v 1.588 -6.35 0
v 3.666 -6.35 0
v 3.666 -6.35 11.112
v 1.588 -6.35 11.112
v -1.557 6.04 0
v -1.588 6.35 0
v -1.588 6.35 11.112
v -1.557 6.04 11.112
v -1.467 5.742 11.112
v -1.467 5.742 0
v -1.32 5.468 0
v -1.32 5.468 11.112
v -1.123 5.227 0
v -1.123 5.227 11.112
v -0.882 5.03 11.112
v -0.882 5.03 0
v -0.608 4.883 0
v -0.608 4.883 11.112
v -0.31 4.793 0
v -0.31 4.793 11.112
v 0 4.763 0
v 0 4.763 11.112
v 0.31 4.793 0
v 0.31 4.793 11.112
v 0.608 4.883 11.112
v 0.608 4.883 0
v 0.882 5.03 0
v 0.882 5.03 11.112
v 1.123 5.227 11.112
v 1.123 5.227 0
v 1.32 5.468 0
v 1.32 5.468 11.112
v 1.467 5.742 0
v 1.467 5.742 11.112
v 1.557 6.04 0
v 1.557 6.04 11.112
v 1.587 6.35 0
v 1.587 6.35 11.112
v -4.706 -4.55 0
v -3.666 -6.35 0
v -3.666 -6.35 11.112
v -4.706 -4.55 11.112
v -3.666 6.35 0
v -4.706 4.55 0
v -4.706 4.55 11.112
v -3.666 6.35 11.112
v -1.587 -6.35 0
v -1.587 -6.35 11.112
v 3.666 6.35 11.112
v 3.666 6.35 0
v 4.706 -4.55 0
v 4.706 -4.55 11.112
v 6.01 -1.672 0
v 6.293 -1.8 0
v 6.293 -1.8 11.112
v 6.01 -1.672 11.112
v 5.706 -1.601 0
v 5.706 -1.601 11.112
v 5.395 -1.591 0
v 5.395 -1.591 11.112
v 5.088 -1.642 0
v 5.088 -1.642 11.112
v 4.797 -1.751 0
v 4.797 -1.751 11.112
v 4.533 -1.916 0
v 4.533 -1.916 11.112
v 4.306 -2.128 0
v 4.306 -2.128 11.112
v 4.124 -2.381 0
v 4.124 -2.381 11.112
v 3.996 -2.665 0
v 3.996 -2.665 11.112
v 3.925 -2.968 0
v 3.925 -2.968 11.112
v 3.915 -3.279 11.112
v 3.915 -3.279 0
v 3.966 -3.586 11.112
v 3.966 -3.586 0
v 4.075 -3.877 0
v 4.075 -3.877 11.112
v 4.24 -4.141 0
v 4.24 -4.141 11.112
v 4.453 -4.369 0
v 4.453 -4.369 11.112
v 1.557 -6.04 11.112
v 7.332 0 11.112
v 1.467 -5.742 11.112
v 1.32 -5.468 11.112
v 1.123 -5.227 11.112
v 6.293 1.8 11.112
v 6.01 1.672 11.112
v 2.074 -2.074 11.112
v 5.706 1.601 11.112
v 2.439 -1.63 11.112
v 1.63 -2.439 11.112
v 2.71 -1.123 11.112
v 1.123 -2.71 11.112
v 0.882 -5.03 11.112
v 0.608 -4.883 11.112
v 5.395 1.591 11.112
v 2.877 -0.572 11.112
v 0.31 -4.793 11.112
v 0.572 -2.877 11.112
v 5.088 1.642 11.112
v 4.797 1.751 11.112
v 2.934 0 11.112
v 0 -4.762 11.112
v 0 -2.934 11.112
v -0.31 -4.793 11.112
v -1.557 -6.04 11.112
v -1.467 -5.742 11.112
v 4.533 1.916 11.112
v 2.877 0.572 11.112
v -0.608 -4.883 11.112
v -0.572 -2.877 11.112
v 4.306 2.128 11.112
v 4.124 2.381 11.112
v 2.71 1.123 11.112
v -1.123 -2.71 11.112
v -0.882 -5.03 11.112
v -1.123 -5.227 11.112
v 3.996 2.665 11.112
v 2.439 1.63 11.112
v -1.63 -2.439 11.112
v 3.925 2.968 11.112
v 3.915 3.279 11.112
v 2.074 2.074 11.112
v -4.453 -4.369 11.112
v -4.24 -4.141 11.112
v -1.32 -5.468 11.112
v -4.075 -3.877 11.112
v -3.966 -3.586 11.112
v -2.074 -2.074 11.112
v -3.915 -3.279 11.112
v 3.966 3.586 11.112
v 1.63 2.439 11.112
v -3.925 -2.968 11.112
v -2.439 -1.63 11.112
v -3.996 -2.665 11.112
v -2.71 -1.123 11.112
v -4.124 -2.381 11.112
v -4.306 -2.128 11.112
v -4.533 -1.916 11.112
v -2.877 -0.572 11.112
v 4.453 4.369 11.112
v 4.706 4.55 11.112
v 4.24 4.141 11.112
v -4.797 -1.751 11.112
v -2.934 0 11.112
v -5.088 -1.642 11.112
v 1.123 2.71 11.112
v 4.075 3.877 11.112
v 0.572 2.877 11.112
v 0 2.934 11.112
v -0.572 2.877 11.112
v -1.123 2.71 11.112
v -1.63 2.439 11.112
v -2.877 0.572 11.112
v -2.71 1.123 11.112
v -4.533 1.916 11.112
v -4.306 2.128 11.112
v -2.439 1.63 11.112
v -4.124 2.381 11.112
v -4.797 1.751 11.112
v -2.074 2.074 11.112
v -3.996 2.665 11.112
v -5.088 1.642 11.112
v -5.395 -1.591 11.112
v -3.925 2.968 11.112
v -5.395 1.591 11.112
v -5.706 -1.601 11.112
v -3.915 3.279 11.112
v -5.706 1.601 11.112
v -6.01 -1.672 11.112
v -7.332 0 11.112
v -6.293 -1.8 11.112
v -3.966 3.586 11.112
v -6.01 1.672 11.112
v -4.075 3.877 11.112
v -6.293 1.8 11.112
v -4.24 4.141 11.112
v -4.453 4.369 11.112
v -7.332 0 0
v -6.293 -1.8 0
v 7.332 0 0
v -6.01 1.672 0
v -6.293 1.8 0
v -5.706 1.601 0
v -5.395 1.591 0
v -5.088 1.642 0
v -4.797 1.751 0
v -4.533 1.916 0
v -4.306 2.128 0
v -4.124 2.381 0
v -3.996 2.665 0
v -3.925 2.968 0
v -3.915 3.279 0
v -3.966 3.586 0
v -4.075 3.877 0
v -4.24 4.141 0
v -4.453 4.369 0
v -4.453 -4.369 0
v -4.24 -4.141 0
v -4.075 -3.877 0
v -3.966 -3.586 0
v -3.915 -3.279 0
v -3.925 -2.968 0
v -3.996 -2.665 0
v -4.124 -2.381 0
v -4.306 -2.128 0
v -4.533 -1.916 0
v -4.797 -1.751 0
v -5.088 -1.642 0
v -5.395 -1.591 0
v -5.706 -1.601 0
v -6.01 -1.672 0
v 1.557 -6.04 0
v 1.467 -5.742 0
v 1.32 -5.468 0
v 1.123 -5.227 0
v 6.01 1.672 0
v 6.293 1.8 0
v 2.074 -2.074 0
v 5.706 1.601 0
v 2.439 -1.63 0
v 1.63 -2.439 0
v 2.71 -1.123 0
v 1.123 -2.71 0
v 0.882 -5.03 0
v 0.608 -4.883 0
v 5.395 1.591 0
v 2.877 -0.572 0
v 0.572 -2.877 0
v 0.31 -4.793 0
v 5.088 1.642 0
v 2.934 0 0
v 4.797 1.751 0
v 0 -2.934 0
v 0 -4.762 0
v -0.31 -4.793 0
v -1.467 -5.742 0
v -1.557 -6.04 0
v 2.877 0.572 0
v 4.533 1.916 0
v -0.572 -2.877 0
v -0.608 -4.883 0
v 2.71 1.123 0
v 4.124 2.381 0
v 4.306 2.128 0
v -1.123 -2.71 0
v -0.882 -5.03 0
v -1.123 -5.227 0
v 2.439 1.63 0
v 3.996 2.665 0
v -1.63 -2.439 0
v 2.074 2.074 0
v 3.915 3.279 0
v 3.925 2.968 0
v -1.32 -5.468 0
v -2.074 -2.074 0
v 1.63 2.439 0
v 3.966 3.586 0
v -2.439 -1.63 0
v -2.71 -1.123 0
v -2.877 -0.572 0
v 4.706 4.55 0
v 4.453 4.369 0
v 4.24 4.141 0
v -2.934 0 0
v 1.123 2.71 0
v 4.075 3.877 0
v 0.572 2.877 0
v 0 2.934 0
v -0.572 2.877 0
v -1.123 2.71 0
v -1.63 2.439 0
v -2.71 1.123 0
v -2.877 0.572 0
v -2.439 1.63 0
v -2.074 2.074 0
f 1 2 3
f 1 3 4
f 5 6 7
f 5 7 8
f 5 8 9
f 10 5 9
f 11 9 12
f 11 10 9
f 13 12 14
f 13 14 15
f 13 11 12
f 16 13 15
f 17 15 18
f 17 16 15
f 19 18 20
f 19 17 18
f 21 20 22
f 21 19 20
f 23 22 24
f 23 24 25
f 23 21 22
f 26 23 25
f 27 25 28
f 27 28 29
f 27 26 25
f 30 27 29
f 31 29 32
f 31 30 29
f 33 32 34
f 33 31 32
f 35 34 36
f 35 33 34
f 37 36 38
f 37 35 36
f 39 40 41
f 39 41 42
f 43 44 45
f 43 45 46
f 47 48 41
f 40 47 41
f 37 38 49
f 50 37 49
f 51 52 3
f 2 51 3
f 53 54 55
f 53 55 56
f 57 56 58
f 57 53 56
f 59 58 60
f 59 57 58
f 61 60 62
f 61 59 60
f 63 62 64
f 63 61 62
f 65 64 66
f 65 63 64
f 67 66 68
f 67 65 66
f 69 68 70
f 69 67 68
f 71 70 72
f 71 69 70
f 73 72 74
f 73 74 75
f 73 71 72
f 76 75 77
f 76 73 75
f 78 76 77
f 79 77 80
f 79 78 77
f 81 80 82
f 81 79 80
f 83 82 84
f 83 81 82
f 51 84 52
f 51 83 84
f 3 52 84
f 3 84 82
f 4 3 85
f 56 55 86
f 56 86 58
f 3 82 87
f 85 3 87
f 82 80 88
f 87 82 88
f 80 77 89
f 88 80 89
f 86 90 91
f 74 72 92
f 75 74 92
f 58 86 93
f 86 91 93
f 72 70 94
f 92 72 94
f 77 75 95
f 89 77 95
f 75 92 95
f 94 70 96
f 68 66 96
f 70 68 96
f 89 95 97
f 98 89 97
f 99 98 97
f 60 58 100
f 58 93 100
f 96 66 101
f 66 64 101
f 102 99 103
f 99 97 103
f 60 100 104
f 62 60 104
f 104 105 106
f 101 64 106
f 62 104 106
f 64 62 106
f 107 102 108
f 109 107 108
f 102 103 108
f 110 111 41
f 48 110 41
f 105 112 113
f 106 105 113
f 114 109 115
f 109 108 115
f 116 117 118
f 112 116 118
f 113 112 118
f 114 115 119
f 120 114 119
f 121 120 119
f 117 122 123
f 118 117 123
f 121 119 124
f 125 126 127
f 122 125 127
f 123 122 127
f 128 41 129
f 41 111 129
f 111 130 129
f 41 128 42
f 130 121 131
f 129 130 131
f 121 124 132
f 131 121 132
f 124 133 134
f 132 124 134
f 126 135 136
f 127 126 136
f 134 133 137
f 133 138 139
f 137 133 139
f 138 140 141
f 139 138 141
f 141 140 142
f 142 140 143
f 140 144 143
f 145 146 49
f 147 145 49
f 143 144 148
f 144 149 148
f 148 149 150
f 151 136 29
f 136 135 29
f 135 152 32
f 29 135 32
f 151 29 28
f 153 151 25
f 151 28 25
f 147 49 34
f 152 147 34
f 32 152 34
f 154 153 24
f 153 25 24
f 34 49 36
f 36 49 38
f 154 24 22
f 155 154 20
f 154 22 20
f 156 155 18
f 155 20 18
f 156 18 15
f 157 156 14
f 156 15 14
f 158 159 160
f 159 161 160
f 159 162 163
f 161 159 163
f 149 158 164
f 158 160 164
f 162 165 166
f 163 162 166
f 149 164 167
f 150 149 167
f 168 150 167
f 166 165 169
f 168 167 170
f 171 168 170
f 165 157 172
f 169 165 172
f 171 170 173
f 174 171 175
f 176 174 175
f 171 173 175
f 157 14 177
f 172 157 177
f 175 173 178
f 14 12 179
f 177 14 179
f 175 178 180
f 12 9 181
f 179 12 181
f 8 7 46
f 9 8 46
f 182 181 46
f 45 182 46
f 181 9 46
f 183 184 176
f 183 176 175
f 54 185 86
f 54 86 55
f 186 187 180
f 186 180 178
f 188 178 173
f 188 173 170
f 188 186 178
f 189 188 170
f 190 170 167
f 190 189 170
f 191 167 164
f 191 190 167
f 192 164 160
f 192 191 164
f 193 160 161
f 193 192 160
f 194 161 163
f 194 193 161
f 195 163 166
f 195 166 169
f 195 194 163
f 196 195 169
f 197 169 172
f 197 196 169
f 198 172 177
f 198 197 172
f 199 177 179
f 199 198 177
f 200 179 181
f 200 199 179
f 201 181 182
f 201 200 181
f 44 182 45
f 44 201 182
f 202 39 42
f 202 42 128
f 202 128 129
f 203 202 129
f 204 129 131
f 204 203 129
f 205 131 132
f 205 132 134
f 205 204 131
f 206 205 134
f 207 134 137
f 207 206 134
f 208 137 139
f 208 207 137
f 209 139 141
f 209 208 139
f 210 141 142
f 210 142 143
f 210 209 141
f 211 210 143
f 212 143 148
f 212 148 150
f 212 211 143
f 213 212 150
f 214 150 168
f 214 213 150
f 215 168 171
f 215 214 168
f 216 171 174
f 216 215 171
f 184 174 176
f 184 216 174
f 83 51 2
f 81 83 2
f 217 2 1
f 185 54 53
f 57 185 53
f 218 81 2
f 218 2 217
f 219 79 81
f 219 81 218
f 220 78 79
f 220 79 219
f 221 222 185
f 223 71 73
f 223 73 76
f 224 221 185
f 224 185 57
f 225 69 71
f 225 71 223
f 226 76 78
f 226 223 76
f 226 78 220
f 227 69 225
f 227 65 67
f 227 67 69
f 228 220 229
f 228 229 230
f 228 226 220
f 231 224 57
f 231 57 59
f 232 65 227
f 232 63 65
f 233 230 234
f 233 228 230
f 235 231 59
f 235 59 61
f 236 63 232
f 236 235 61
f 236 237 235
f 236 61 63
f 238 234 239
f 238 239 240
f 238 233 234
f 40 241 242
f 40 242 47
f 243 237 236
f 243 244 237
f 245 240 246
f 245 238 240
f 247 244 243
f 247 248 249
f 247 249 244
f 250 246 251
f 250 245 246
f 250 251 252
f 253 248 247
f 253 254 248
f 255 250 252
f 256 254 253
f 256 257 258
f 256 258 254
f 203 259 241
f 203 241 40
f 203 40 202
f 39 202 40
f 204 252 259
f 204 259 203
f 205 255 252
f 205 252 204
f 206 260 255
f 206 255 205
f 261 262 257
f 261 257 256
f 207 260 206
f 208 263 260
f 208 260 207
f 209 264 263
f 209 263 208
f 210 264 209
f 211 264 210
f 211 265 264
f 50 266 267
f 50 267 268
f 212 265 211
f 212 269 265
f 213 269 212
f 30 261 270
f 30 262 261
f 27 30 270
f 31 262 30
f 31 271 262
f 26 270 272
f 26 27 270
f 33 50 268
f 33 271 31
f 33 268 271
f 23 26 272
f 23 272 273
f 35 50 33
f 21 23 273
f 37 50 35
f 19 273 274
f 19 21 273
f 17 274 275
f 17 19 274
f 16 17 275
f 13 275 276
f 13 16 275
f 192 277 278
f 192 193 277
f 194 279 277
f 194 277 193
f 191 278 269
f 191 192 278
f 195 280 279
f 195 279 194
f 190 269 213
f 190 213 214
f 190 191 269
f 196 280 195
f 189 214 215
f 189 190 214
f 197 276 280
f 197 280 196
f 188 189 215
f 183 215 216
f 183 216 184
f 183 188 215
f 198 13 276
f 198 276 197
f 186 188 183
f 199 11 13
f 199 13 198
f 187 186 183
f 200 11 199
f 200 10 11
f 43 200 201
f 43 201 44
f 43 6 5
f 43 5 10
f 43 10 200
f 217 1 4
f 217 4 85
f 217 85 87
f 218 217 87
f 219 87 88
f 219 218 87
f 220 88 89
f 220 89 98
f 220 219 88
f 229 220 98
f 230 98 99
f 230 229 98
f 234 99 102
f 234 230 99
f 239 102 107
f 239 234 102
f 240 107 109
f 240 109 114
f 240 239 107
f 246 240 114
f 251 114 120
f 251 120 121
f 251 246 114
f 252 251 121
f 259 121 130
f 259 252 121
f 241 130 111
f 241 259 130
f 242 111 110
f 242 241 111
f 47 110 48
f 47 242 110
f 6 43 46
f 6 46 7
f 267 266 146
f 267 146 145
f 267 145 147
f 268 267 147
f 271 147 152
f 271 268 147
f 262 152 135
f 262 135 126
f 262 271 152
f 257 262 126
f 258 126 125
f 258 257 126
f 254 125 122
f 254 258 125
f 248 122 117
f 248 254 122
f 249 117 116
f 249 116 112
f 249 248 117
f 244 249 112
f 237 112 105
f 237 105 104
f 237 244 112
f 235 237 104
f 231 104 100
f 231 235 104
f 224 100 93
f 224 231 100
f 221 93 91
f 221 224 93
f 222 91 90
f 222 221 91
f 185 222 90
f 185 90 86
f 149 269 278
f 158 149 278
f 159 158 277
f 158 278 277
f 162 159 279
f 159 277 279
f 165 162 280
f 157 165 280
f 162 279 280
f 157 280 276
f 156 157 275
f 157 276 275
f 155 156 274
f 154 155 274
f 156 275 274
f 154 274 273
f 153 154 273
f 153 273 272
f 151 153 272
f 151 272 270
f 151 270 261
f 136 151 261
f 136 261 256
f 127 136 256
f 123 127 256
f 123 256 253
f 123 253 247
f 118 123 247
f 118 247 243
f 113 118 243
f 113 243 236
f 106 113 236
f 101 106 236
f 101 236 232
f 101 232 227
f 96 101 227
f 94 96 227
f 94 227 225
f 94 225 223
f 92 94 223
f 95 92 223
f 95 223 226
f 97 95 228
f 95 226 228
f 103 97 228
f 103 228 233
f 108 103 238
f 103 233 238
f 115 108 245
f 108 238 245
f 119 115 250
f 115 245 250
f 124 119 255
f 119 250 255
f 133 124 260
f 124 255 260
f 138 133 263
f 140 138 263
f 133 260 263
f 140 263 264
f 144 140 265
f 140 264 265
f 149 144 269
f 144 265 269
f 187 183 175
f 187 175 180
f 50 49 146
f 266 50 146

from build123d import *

# Parameters (mm, degrees)
SKETCH1_R           = 2.9337
BOSS_EXTRUDE1_DEPTH = 15.875
CUT_EXTRUDE1_DEPTH  = 4.7625


with BuildPart() as part:
    # Sketch1 → Boss-Extrude1 (new body)
    with BuildSketch(Plane(origin=(0, 0, 0), x_dir=(-1, 0, 0), z_dir=(0, 0, -1))):
        with BuildLine():
            Line((-4.70551159, -4.549815043), (-3.666174521, -6.349999904))
            Line((-3.666174521, -6.349999904), (-1.587500385, -6.349999904))
            ThreePointArc((-1.587500385, -6.349999904), (-3.85e-07, -4.762499904), (1.587499615, -6.349999904))
            Line((1.587499615, -6.349999904), (3.666173825, -6.349999904))
            Line((3.666173825, -6.349999904), (4.705510942, -4.54981524))
            ThreePointArc((4.705510942, -4.54981524), (4.124445629, -2.381249907), (6.293010962, -1.800184594))
            Line((6.293010962, -1.800184594), (7.332348079, 7e-08))
            Line((7.332348079, 7e-08), (6.293011217, 1.800184685))
            ThreePointArc((6.293011217, 1.800184685), (4.124445939, 2.381250203), (4.705511457, 4.549815481))
            Line((4.705511457, 4.549815481), (3.666174521, 6.350000222))
            Line((3.666174521, 6.350000222), (1.587500385, 6.350000222))
            ThreePointArc((1.587500385, 6.350000222), (3.85e-07, 4.762500222), (-1.587499615, 6.350000222))
            Line((-1.587499615, 6.350000222), (-3.666173825, 6.350000222))
            Line((-3.666173825, 6.350000222), (-4.705511038, 4.549815614))
            ThreePointArc((-4.705511038, 4.549815614), (-4.124445841, 2.38125025), (-6.293011205, 1.800185053))
            Line((-6.293011205, 1.800185053), (-7.332348419, 4.44e-07))
            Line((-7.332348419, 4.44e-07), (-6.293011423, -1.80018429))
            ThreePointArc((-6.293011423, -1.80018429), (-4.12444613, -2.38124975), (-4.70551159, -4.549815043))
        make_face()
        Circle(SKETCH1_R, mode=Mode.SUBTRACT)
    extrude(amount=-BOSS_EXTRUDE1_DEPTH)

    # Sketch3 → Cut-Extrude1 (cut)
    with BuildSketch(Plane.XY.offset(15.875)):
        with BuildLine():
            Line((-4.705511457, 4.549815481), (-3.666174521, 6.350000222))
            Line((-3.666174521, 6.350000222), (-1.587500385, 6.350000222))
            ThreePointArc((-1.587500385, 6.350000222), (-3.85e-07, 4.762500222), (1.587499615, 6.350000222))
            Line((1.587499615, 6.350000222), (3.666173825, 6.350000222))
            Line((3.666173825, 6.350000222), (4.705511038, 4.549815614))
            ThreePointArc((4.705511038, 4.549815614), (4.124445841, 2.38125025), (6.293011205, 1.800185053))
            Line((6.293011205, 1.800185053), (7.332348419, 4.44e-07))
            Line((7.332348419, 4.44e-07), (6.293011423, -1.80018429))
            ThreePointArc((6.293011423, -1.80018429), (4.12444613, -2.38124975), (4.70551159, -4.549815043))
            Line((4.70551159, -4.549815043), (3.666174521, -6.349999904))
            Line((3.666174521, -6.349999904), (1.587500385, -6.349999904))
            ThreePointArc((1.587500385, -6.349999904), (3.85e-07, -4.762499904), (-1.587499615, -6.349999904))
            Line((-1.587499615, -6.349999904), (-3.666173825, -6.349999904))
            Line((-3.666173825, -6.349999904), (-4.705510942, -4.54981524))
            ThreePointArc((-4.705510942, -4.54981524), (-4.124445629, -2.381249907), (-6.293010962, -1.800184594))
            Line((-6.293010962, -1.800184594), (-7.332348079, 7e-08))
            Line((-7.332348079, 7e-08), (-6.293011217, 1.800184685))
            ThreePointArc((-6.293011217, 1.800184685), (-4.124445939, 2.381250203), (-4.705511457, 4.549815481))
        make_face()
    extrude(amount=-CUT_EXTRUDE1_DEPTH, mode=Mode.SUBTRACT)


solid = part.part
